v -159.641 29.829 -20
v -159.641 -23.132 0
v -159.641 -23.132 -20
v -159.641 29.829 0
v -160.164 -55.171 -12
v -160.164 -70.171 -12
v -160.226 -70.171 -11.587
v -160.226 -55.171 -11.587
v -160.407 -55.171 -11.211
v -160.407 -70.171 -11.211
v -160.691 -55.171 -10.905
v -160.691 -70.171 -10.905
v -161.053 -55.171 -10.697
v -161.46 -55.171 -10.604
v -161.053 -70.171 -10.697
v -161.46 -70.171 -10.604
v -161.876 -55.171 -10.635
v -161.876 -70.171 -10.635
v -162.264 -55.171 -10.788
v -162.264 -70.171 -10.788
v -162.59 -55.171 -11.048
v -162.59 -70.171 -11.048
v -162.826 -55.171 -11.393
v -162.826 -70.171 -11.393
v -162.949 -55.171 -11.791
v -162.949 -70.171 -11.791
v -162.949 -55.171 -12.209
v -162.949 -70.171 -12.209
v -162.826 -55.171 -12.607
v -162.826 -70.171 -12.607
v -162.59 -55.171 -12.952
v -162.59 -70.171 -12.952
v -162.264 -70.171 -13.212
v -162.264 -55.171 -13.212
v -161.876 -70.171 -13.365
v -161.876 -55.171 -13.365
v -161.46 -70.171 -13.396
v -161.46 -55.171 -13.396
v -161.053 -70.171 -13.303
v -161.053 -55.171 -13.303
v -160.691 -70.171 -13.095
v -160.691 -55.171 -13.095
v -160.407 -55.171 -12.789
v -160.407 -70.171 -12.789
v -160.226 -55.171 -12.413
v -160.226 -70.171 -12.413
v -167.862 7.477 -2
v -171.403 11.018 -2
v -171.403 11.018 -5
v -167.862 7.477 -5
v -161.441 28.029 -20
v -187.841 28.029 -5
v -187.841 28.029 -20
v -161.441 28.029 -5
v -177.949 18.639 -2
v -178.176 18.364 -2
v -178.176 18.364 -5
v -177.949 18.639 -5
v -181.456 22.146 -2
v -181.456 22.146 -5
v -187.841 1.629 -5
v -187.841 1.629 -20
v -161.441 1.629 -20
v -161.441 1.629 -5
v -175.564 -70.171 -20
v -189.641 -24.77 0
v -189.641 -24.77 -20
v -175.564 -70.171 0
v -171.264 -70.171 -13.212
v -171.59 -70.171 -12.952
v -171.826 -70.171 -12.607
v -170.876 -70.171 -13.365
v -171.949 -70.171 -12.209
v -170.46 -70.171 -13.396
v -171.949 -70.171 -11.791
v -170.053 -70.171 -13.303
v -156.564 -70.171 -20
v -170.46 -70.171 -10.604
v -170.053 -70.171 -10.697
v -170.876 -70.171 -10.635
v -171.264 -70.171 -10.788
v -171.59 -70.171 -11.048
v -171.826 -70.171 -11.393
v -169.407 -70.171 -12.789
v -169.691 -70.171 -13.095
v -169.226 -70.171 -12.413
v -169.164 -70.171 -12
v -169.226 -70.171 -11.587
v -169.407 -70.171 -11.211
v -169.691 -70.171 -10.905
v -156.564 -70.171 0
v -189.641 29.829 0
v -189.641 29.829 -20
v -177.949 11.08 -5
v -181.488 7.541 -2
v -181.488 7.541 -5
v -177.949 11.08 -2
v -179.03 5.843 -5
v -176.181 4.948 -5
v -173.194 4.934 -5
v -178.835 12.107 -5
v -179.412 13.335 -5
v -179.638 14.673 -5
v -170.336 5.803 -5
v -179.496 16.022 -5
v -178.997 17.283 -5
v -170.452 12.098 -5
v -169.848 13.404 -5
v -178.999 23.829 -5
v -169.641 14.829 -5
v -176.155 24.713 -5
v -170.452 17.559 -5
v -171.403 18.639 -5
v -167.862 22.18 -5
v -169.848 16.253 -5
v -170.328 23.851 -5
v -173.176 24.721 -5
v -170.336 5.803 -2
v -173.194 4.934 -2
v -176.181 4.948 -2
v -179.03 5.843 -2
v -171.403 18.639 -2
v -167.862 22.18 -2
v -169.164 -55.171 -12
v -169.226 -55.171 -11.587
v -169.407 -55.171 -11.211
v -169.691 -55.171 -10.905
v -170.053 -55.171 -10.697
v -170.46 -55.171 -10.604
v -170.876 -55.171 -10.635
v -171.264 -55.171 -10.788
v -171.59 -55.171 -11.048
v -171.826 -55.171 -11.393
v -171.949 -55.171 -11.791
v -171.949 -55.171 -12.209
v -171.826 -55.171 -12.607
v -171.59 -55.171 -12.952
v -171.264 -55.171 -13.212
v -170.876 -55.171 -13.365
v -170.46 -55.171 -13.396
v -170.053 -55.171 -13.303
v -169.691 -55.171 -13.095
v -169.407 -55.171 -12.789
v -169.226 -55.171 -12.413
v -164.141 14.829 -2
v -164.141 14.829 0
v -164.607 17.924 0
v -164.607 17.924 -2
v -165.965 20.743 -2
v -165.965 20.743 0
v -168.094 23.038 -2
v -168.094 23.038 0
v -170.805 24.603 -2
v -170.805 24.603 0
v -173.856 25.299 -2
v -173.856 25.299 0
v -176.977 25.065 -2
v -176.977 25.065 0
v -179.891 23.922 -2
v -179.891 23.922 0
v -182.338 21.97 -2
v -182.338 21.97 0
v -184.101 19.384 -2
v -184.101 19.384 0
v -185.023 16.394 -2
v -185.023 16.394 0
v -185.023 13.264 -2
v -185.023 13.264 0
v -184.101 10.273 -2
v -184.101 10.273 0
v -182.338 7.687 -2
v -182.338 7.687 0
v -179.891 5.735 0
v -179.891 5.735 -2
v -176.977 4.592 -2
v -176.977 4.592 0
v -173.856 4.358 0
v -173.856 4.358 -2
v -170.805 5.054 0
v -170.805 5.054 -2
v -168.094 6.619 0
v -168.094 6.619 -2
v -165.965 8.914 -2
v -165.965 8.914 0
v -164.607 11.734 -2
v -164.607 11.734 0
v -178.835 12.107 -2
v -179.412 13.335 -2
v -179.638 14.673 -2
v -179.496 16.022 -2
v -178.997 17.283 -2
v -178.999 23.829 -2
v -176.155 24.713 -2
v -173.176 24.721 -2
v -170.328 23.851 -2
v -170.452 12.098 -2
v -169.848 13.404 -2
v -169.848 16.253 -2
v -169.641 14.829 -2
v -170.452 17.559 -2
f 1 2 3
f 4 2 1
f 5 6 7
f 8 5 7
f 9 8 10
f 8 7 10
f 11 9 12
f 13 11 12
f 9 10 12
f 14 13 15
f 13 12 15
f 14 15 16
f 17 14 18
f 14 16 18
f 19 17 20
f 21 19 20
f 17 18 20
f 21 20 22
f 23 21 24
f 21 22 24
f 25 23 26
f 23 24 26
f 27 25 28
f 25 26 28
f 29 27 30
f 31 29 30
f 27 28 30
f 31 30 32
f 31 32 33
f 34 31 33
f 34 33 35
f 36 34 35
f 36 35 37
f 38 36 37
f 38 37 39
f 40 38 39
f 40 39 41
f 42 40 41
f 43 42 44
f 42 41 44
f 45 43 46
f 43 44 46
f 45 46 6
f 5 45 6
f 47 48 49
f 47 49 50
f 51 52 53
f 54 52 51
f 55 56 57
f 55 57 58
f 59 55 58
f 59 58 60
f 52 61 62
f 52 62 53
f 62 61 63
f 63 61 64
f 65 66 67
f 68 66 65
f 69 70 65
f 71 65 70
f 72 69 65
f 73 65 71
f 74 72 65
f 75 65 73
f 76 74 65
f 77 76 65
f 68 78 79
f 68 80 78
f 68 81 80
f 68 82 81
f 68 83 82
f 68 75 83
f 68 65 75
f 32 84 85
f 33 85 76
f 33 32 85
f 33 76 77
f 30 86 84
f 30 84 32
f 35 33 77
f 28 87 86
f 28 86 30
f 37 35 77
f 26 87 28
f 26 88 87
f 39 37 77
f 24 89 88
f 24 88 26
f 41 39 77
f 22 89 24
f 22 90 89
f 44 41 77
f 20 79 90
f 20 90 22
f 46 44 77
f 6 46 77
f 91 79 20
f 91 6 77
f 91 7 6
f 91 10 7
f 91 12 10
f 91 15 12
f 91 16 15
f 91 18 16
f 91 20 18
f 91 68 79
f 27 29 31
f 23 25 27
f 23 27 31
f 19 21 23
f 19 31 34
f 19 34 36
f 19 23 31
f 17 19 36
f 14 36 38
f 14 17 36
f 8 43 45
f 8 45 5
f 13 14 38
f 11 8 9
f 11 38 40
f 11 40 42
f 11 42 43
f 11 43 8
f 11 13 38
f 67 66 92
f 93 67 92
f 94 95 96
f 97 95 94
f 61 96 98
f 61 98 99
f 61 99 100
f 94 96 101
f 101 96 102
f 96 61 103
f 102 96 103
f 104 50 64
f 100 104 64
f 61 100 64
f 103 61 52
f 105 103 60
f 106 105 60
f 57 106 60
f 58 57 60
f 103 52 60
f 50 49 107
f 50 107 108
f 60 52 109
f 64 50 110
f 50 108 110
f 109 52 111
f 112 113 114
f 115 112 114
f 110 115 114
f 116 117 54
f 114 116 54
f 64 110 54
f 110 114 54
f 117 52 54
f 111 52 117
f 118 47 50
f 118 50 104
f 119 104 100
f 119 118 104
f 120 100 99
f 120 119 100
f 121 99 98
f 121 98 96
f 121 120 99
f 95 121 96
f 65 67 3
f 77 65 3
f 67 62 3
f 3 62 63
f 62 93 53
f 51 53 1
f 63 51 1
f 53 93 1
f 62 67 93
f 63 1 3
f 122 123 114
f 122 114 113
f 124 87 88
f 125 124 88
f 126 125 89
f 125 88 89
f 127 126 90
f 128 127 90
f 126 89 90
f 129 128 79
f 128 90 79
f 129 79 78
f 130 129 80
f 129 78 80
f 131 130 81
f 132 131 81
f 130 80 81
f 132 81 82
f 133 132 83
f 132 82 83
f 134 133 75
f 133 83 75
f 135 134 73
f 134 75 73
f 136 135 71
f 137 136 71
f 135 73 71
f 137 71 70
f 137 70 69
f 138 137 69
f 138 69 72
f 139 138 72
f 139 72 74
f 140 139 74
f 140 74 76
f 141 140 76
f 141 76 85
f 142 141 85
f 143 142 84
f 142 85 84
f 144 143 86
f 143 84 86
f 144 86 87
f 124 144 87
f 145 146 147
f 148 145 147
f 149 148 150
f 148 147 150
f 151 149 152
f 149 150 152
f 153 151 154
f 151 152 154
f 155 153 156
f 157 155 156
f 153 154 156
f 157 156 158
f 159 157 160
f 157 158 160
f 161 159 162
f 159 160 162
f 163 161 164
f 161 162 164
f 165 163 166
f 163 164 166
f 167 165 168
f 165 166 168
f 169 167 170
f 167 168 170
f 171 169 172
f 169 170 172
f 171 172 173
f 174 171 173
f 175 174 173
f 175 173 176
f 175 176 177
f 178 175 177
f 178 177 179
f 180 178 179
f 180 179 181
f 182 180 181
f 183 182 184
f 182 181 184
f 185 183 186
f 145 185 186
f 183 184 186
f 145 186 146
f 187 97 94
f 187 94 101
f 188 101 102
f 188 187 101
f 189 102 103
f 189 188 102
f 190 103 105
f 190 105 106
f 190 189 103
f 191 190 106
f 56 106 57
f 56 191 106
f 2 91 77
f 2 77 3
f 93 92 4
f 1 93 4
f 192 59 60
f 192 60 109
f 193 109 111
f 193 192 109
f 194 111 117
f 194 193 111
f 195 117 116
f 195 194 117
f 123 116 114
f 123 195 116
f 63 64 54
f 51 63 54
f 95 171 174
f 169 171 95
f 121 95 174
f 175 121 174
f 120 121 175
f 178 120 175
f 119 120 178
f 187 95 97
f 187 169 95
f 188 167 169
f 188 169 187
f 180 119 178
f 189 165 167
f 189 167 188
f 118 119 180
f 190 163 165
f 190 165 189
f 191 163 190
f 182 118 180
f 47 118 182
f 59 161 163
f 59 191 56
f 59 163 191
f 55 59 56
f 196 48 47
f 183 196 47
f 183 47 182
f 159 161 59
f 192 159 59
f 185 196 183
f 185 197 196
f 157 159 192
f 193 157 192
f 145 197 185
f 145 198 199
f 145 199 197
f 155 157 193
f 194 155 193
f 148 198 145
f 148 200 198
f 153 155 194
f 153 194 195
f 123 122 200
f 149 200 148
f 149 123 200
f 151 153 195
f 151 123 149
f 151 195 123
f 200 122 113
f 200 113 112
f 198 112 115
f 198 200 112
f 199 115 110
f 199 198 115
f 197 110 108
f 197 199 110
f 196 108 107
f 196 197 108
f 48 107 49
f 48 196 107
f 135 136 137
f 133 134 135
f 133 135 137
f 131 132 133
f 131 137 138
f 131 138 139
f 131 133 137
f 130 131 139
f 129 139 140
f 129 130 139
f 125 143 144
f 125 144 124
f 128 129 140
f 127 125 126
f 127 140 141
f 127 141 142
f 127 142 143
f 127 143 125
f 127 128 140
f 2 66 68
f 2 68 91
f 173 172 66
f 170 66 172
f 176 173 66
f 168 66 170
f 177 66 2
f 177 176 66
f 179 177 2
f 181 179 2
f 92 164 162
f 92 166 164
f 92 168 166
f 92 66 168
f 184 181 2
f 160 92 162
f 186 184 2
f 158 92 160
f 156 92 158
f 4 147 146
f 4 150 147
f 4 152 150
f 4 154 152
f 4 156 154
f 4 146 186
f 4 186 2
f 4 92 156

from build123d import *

# Parameters (mm, degrees)
SKETCH1_3_W         = 26.4
SKETCH1_3_H         = 26.4
BOSS_EXTRUDE3_DEPTH = 20
SKETCH1_10_W        = 26.4
SKETCH1_10_H        = 26.4
BOSS_EXTRUDE7_DEPTH = 5
SKETCH1_R           = 10.5
CUT_EXTRUDE1_DEPTH  = 2
SKETCH2_R           = 1.4
CUT_EXTRUDE2_DEPTH  = 15


with BuildPart() as part:
    # Sketch1<3> → Boss-Extrude3 (new body)
    with BuildSketch(Plane.XY):
        Polygon((-189.640703899, -24.770069728), (-175.564173506, -70.171428571), (-156.564173506, -70.171428571), (-159.640703899, -23.131847808), (-159.640703899, 29.828571429), (-189.640703899, 29.828571429), align=None)
        with Locations((-174.640703899, 14.828571429)):
            Rectangle(SKETCH1_3_W, SKETCH1_3_H, mode=Mode.SUBTRACT)
    extrude(amount=-BOSS_EXTRUDE3_DEPTH)

    # Sketch1<10> → Boss-Extrude7 (add)
    with BuildSketch(Plane.XY):
        with Locations((-174.640703899, 14.828571429)):
            Rectangle(SKETCH1_10_W, SKETCH1_10_H)
        with BuildLine():
            Line((-171.403251306, 11.018203899), (-167.861898306, 7.4768509))
            ThreePointArc((-167.861898306, 7.4768509), (-174.687644898, 4.828681602), (-181.488229417, 7.540814964))
            Line((-181.488229417, 7.540814964), (-177.949263698, 11.079780683))
            ThreePointArc((-177.949263698, 11.079780683), (-179.638278417, 14.672850745), (-178.176237805, 18.364105335))
            Line((-178.176237805, 18.364105335), (-177.949263698, 18.638938958))
            Line((-177.949263698, 18.638938958), (-181.456415012, 22.146090272))
            ThreePointArc((-181.456415012, 22.146090272), (-174.665862261, 24.828539781), (-167.861898306, 22.180291958))
            Line((-167.861898306, 22.180291958), (-171.403251306, 18.638938958))
            ThreePointArc((-171.403251306, 18.638938958), (-169.640703899, 14.828571429), (-171.403251306, 11.018203899))
        make_face(mode=Mode.SUBTRACT)
    extrude(amount=-BOSS_EXTRUDE7_DEPTH)

    # Sketch1 → Cut-Extrude1 (cut)
    with BuildSketch(Plane.XY):
        with Locations((-174.640703899, 14.828571429)):
            Circle(SKETCH1_R)
        with BuildLine():
            ThreePointArc((-171.403251306, 18.638938958), (-169.640703899, 14.828571429), (-171.403251306, 11.018203899))
            Line((-171.403251306, 11.018203899), (-167.861898306, 7.4768509))
            ThreePointArc((-167.861898306, 7.4768509), (-174.687644898, 4.828681602), (-181.488229417, 7.540814964))
            Line((-181.488229417, 7.540814964), (-177.949263698, 11.079780683))
            ThreePointArc((-177.949263698, 11.079780683), (-179.638278417, 14.672850745), (-178.176237805, 18.364105335))
            Line((-178.176237805, 18.364105335), (-177.949263698, 18.638938958))
            Line((-177.949263698, 18.638938958), (-181.456415012, 22.146090272))
            ThreePointArc((-181.456415012, 22.146090272), (-174.665862261, 24.828539781), (-167.861898306, 22.180291958))
            Line((-167.861898306, 22.180291958), (-171.403251306, 18.638938958))
        make_face(mode=Mode.SUBTRACT)
    extrude(amount=-CUT_EXTRUDE1_DEPTH, mode=Mode.SUBTRACT)

    # Sketch2 → Cut-Extrude2 (cut)
    with BuildSketch(Plane(origin=(0, -70.171428571, 0), x_dir=(-1, 0, 0), z_dir=(0, -1, 0))):
        with Locations((161.564173506, 12)):
            Circle(SKETCH2_R)
        with Locations((170.564173506, 12)):
            Circle(SKETCH2_R)
    extrude(amount=-CUT_EXTRUDE2_DEPTH, mode=Mode.SUBTRACT)


solid = part.part
